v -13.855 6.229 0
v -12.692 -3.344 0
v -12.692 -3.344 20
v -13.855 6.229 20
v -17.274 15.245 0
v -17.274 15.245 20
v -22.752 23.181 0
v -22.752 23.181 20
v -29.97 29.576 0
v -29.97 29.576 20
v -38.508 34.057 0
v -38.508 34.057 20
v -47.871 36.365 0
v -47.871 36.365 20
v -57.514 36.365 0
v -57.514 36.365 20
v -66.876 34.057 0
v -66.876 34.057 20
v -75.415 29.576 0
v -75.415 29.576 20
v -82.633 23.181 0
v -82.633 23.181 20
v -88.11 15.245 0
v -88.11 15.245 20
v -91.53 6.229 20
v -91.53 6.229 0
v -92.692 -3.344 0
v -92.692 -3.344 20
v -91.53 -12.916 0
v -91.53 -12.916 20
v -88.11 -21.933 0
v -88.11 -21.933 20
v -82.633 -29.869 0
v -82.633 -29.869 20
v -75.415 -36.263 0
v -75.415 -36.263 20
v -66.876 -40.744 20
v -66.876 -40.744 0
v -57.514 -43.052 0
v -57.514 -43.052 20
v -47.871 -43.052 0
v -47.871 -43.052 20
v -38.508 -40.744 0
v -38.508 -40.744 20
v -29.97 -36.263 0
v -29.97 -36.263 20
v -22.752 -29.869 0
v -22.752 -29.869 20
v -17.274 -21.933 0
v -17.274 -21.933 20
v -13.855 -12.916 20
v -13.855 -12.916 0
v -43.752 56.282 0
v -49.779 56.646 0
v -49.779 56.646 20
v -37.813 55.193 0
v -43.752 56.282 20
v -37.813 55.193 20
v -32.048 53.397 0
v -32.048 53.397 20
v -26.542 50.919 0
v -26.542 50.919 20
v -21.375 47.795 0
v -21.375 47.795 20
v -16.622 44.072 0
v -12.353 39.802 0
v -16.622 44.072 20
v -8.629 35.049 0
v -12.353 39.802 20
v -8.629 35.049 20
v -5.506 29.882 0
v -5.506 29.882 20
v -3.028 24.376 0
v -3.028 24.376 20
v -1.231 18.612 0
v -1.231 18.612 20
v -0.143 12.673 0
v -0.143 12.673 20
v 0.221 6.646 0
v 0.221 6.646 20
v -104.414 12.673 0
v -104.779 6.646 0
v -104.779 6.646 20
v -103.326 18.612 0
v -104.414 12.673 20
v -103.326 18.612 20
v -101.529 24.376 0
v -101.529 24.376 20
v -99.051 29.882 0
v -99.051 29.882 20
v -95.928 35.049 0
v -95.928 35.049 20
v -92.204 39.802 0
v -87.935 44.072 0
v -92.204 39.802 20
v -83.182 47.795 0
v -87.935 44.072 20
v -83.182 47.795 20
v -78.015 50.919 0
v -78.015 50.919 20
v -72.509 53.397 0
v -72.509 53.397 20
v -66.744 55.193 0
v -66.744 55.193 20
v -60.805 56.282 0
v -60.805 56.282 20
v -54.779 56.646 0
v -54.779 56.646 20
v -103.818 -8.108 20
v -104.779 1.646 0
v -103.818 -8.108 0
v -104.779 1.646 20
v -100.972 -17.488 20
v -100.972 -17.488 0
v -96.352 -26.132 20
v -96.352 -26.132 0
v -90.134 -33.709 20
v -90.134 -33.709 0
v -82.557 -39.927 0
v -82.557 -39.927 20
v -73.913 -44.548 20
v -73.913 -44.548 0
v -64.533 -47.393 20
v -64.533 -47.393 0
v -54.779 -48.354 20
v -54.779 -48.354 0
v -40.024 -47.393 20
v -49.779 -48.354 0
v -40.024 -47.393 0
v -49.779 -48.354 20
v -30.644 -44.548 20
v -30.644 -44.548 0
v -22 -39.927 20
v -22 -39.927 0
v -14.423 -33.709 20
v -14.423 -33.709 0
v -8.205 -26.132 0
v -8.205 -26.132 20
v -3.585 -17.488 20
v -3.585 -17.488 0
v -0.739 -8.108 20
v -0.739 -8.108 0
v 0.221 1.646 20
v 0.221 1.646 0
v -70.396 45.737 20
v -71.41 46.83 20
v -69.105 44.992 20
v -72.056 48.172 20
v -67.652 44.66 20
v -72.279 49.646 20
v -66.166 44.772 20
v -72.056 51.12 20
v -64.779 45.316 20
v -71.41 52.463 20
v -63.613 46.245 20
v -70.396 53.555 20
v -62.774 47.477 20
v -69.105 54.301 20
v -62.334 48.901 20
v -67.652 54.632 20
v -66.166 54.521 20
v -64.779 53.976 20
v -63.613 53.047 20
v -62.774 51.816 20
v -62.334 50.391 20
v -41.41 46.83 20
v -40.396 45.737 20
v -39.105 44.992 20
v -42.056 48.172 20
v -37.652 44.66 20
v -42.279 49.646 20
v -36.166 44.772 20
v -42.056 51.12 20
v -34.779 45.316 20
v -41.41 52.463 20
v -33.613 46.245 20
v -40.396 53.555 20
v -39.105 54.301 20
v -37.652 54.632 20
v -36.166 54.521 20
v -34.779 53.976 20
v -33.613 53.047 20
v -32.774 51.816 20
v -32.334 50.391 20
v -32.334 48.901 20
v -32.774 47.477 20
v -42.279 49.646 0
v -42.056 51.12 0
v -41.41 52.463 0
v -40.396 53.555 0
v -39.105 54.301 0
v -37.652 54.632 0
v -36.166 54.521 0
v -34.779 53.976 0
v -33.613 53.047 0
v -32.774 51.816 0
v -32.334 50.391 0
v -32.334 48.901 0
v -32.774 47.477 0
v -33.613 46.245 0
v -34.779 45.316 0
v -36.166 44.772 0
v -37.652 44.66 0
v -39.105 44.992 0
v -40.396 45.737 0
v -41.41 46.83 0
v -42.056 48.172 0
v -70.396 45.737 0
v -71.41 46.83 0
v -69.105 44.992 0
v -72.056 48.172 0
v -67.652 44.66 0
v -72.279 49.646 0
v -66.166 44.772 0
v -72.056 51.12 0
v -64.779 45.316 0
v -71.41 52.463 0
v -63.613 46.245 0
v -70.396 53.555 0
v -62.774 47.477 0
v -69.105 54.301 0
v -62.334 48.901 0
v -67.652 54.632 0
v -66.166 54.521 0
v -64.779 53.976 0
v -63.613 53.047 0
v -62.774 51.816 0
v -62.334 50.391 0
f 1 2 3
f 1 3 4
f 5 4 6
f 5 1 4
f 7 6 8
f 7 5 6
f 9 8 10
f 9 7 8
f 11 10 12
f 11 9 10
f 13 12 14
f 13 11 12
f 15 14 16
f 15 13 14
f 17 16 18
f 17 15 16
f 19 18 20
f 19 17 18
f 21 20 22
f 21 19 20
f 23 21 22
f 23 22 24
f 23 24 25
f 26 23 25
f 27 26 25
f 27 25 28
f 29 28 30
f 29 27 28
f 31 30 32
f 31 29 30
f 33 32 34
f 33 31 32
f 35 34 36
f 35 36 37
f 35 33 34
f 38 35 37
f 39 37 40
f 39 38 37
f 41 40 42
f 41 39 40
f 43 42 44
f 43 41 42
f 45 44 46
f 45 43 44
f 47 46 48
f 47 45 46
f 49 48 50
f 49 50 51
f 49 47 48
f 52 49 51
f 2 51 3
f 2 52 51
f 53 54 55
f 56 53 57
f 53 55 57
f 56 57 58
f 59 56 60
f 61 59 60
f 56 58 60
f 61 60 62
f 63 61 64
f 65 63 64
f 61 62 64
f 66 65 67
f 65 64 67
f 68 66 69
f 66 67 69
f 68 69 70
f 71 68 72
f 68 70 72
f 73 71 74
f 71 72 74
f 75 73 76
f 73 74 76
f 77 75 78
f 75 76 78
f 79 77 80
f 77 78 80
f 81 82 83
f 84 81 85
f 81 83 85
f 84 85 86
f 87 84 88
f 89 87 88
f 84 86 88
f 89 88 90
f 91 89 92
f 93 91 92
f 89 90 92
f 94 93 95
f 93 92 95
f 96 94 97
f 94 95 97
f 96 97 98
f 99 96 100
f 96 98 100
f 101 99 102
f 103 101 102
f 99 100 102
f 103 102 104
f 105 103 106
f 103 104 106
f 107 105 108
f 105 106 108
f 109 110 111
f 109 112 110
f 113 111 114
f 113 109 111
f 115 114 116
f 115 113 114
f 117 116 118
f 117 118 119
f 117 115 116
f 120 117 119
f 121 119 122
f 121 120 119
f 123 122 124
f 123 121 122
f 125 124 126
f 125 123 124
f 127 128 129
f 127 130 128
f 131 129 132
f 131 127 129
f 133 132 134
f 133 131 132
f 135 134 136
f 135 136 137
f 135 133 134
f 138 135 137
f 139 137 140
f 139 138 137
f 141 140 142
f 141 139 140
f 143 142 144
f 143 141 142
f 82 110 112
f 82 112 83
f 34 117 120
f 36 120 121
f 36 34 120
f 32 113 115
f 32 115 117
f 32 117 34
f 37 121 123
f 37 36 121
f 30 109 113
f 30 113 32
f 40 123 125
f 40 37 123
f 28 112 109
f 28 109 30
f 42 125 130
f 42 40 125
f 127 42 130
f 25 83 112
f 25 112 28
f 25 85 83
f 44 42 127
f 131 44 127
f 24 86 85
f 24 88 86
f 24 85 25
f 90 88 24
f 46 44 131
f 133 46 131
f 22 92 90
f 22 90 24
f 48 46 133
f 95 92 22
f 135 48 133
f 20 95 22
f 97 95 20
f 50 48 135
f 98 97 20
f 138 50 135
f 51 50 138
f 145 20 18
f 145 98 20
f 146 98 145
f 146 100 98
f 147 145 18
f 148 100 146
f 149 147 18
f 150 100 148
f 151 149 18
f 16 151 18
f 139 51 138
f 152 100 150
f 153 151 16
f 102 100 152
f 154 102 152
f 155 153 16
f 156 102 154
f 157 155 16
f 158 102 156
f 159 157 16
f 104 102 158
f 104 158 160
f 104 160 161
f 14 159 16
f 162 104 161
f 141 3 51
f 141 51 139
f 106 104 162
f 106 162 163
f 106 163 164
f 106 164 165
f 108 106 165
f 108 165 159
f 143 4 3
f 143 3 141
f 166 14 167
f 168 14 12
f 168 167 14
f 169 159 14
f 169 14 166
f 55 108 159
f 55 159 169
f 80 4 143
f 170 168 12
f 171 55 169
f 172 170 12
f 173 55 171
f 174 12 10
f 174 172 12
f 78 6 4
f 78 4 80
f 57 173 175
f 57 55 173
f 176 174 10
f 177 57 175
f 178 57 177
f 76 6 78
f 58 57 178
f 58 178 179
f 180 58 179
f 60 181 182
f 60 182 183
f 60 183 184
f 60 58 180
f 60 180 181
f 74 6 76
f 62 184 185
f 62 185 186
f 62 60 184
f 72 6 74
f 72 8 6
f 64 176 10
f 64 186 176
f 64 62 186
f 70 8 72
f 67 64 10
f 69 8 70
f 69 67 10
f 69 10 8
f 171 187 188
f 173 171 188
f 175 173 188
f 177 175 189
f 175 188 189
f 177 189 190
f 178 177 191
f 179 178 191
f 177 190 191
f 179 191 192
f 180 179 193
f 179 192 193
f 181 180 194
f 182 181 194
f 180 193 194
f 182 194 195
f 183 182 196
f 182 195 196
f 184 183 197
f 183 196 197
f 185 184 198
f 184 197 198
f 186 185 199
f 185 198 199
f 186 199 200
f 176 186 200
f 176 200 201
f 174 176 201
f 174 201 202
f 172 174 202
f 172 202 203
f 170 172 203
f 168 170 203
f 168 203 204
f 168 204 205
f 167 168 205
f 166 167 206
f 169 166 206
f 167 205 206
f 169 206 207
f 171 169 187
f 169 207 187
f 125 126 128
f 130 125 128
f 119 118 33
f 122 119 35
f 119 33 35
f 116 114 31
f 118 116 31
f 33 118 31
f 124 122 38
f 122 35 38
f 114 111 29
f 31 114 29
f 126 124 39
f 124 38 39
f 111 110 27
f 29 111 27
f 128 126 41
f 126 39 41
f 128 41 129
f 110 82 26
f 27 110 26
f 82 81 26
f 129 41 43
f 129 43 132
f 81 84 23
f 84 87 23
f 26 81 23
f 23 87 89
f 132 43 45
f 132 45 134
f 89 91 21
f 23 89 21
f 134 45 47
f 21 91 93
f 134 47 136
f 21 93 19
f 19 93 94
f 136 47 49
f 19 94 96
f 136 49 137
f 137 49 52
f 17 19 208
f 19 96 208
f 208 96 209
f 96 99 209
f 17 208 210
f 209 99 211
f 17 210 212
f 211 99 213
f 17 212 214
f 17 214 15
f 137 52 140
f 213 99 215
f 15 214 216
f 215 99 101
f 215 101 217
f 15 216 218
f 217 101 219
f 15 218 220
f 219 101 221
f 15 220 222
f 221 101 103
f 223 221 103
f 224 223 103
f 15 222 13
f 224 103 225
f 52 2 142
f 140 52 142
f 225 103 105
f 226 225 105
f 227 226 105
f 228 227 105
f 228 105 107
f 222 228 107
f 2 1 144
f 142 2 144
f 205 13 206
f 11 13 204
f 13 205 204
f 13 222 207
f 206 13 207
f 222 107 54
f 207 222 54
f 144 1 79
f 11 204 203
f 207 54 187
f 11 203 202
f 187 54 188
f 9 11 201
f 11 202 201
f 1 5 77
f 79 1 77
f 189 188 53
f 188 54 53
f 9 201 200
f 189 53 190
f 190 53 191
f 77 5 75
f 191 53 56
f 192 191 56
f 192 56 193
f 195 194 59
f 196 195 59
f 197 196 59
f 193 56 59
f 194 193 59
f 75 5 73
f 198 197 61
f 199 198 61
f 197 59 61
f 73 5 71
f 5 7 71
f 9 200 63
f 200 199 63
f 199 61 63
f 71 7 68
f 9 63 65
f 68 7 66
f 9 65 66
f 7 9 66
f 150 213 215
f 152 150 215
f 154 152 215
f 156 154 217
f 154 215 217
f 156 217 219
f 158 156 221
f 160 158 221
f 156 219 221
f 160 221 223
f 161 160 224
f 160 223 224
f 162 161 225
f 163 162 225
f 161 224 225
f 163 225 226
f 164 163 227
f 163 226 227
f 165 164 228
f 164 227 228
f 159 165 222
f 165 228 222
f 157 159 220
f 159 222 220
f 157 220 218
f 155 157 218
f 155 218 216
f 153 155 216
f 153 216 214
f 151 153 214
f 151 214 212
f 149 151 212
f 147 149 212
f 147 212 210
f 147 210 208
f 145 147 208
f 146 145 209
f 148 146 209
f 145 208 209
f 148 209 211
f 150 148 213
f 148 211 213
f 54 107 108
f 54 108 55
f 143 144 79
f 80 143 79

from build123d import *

# Parameters (mm, degrees)
SKETCH1_W           = 105
SKETCH1_H           = 105
BOSS_EXTRUDE1_DEPTH = 20
HOLE5_OUTLINE_R     = 40
HOLE5_DEPTH         = 20
SKETCH14_R          = 5
CUT_EXTRUDE2_DEPTH  = 20
LPATTERN2_COUNT     = 2
LPATTERN2_PITCH     = 30
FILLET3_R           = 50


# Read off the part's stored shape, not the designer's step: Hole5
with BuildPart() as part:
    # Sketch1 → Boss-Extrude1 (new body)
    with BuildSketch(Plane(origin=(-15.357562319, 50.523240315, 0), x_dir=(1, 0, 0), z_dir=(0, 0, 1))):
        with Locations((-36.920942408, -46.377068063)):
            Rectangle(SKETCH1_W, SKETCH1_H)
    extrude(amount=BOSS_EXTRUDE1_DEPTH)

    # Hole5 outline → Hole5 (cut)
    with BuildSketch(Plane.XY):
        with Locations((-52.692198598, -3.343760422)):
            Circle(HOLE5_OUTLINE_R)
    extrude(amount=HOLE5_DEPTH, mode=Mode.SUBTRACT)

    # Sketch14 → Cut-Extrude2 (cut)
    with BuildSketch(Plane(origin=(0, 0, 0), x_dir=(-1, 0, 0), z_dir=(0, 0, -1))):
        with Locations((37.278504727, 49.646172252)):
            Circle(SKETCH14_R)
    cut_extrude2 = extrude(amount=-CUT_EXTRUDE2_DEPTH, mode=Mode.SUBTRACT)

    # LPattern2: Cut-Extrude2 ×2
    with Locations(*[(-i * LPATTERN2_PITCH, 0, 0) for i in range(1, LPATTERN2_COUNT)]):
        add(cut_extrude2, mode=Mode.SUBTRACT)

    # Fillet3
    fillet3_edges = [part.edges().sort_by_distance(p)[0] for p in [
        (-104.778504727, 56.646172252, 10),
        (0.221495273, 56.646172252, 10),
        (0.221495273, -48.353827748, 10),
        (-104.778504727, -48.353827748, 10),
    ]]
    fillet(fillet3_edges, radius=FILLET3_R)


solid = part.part
